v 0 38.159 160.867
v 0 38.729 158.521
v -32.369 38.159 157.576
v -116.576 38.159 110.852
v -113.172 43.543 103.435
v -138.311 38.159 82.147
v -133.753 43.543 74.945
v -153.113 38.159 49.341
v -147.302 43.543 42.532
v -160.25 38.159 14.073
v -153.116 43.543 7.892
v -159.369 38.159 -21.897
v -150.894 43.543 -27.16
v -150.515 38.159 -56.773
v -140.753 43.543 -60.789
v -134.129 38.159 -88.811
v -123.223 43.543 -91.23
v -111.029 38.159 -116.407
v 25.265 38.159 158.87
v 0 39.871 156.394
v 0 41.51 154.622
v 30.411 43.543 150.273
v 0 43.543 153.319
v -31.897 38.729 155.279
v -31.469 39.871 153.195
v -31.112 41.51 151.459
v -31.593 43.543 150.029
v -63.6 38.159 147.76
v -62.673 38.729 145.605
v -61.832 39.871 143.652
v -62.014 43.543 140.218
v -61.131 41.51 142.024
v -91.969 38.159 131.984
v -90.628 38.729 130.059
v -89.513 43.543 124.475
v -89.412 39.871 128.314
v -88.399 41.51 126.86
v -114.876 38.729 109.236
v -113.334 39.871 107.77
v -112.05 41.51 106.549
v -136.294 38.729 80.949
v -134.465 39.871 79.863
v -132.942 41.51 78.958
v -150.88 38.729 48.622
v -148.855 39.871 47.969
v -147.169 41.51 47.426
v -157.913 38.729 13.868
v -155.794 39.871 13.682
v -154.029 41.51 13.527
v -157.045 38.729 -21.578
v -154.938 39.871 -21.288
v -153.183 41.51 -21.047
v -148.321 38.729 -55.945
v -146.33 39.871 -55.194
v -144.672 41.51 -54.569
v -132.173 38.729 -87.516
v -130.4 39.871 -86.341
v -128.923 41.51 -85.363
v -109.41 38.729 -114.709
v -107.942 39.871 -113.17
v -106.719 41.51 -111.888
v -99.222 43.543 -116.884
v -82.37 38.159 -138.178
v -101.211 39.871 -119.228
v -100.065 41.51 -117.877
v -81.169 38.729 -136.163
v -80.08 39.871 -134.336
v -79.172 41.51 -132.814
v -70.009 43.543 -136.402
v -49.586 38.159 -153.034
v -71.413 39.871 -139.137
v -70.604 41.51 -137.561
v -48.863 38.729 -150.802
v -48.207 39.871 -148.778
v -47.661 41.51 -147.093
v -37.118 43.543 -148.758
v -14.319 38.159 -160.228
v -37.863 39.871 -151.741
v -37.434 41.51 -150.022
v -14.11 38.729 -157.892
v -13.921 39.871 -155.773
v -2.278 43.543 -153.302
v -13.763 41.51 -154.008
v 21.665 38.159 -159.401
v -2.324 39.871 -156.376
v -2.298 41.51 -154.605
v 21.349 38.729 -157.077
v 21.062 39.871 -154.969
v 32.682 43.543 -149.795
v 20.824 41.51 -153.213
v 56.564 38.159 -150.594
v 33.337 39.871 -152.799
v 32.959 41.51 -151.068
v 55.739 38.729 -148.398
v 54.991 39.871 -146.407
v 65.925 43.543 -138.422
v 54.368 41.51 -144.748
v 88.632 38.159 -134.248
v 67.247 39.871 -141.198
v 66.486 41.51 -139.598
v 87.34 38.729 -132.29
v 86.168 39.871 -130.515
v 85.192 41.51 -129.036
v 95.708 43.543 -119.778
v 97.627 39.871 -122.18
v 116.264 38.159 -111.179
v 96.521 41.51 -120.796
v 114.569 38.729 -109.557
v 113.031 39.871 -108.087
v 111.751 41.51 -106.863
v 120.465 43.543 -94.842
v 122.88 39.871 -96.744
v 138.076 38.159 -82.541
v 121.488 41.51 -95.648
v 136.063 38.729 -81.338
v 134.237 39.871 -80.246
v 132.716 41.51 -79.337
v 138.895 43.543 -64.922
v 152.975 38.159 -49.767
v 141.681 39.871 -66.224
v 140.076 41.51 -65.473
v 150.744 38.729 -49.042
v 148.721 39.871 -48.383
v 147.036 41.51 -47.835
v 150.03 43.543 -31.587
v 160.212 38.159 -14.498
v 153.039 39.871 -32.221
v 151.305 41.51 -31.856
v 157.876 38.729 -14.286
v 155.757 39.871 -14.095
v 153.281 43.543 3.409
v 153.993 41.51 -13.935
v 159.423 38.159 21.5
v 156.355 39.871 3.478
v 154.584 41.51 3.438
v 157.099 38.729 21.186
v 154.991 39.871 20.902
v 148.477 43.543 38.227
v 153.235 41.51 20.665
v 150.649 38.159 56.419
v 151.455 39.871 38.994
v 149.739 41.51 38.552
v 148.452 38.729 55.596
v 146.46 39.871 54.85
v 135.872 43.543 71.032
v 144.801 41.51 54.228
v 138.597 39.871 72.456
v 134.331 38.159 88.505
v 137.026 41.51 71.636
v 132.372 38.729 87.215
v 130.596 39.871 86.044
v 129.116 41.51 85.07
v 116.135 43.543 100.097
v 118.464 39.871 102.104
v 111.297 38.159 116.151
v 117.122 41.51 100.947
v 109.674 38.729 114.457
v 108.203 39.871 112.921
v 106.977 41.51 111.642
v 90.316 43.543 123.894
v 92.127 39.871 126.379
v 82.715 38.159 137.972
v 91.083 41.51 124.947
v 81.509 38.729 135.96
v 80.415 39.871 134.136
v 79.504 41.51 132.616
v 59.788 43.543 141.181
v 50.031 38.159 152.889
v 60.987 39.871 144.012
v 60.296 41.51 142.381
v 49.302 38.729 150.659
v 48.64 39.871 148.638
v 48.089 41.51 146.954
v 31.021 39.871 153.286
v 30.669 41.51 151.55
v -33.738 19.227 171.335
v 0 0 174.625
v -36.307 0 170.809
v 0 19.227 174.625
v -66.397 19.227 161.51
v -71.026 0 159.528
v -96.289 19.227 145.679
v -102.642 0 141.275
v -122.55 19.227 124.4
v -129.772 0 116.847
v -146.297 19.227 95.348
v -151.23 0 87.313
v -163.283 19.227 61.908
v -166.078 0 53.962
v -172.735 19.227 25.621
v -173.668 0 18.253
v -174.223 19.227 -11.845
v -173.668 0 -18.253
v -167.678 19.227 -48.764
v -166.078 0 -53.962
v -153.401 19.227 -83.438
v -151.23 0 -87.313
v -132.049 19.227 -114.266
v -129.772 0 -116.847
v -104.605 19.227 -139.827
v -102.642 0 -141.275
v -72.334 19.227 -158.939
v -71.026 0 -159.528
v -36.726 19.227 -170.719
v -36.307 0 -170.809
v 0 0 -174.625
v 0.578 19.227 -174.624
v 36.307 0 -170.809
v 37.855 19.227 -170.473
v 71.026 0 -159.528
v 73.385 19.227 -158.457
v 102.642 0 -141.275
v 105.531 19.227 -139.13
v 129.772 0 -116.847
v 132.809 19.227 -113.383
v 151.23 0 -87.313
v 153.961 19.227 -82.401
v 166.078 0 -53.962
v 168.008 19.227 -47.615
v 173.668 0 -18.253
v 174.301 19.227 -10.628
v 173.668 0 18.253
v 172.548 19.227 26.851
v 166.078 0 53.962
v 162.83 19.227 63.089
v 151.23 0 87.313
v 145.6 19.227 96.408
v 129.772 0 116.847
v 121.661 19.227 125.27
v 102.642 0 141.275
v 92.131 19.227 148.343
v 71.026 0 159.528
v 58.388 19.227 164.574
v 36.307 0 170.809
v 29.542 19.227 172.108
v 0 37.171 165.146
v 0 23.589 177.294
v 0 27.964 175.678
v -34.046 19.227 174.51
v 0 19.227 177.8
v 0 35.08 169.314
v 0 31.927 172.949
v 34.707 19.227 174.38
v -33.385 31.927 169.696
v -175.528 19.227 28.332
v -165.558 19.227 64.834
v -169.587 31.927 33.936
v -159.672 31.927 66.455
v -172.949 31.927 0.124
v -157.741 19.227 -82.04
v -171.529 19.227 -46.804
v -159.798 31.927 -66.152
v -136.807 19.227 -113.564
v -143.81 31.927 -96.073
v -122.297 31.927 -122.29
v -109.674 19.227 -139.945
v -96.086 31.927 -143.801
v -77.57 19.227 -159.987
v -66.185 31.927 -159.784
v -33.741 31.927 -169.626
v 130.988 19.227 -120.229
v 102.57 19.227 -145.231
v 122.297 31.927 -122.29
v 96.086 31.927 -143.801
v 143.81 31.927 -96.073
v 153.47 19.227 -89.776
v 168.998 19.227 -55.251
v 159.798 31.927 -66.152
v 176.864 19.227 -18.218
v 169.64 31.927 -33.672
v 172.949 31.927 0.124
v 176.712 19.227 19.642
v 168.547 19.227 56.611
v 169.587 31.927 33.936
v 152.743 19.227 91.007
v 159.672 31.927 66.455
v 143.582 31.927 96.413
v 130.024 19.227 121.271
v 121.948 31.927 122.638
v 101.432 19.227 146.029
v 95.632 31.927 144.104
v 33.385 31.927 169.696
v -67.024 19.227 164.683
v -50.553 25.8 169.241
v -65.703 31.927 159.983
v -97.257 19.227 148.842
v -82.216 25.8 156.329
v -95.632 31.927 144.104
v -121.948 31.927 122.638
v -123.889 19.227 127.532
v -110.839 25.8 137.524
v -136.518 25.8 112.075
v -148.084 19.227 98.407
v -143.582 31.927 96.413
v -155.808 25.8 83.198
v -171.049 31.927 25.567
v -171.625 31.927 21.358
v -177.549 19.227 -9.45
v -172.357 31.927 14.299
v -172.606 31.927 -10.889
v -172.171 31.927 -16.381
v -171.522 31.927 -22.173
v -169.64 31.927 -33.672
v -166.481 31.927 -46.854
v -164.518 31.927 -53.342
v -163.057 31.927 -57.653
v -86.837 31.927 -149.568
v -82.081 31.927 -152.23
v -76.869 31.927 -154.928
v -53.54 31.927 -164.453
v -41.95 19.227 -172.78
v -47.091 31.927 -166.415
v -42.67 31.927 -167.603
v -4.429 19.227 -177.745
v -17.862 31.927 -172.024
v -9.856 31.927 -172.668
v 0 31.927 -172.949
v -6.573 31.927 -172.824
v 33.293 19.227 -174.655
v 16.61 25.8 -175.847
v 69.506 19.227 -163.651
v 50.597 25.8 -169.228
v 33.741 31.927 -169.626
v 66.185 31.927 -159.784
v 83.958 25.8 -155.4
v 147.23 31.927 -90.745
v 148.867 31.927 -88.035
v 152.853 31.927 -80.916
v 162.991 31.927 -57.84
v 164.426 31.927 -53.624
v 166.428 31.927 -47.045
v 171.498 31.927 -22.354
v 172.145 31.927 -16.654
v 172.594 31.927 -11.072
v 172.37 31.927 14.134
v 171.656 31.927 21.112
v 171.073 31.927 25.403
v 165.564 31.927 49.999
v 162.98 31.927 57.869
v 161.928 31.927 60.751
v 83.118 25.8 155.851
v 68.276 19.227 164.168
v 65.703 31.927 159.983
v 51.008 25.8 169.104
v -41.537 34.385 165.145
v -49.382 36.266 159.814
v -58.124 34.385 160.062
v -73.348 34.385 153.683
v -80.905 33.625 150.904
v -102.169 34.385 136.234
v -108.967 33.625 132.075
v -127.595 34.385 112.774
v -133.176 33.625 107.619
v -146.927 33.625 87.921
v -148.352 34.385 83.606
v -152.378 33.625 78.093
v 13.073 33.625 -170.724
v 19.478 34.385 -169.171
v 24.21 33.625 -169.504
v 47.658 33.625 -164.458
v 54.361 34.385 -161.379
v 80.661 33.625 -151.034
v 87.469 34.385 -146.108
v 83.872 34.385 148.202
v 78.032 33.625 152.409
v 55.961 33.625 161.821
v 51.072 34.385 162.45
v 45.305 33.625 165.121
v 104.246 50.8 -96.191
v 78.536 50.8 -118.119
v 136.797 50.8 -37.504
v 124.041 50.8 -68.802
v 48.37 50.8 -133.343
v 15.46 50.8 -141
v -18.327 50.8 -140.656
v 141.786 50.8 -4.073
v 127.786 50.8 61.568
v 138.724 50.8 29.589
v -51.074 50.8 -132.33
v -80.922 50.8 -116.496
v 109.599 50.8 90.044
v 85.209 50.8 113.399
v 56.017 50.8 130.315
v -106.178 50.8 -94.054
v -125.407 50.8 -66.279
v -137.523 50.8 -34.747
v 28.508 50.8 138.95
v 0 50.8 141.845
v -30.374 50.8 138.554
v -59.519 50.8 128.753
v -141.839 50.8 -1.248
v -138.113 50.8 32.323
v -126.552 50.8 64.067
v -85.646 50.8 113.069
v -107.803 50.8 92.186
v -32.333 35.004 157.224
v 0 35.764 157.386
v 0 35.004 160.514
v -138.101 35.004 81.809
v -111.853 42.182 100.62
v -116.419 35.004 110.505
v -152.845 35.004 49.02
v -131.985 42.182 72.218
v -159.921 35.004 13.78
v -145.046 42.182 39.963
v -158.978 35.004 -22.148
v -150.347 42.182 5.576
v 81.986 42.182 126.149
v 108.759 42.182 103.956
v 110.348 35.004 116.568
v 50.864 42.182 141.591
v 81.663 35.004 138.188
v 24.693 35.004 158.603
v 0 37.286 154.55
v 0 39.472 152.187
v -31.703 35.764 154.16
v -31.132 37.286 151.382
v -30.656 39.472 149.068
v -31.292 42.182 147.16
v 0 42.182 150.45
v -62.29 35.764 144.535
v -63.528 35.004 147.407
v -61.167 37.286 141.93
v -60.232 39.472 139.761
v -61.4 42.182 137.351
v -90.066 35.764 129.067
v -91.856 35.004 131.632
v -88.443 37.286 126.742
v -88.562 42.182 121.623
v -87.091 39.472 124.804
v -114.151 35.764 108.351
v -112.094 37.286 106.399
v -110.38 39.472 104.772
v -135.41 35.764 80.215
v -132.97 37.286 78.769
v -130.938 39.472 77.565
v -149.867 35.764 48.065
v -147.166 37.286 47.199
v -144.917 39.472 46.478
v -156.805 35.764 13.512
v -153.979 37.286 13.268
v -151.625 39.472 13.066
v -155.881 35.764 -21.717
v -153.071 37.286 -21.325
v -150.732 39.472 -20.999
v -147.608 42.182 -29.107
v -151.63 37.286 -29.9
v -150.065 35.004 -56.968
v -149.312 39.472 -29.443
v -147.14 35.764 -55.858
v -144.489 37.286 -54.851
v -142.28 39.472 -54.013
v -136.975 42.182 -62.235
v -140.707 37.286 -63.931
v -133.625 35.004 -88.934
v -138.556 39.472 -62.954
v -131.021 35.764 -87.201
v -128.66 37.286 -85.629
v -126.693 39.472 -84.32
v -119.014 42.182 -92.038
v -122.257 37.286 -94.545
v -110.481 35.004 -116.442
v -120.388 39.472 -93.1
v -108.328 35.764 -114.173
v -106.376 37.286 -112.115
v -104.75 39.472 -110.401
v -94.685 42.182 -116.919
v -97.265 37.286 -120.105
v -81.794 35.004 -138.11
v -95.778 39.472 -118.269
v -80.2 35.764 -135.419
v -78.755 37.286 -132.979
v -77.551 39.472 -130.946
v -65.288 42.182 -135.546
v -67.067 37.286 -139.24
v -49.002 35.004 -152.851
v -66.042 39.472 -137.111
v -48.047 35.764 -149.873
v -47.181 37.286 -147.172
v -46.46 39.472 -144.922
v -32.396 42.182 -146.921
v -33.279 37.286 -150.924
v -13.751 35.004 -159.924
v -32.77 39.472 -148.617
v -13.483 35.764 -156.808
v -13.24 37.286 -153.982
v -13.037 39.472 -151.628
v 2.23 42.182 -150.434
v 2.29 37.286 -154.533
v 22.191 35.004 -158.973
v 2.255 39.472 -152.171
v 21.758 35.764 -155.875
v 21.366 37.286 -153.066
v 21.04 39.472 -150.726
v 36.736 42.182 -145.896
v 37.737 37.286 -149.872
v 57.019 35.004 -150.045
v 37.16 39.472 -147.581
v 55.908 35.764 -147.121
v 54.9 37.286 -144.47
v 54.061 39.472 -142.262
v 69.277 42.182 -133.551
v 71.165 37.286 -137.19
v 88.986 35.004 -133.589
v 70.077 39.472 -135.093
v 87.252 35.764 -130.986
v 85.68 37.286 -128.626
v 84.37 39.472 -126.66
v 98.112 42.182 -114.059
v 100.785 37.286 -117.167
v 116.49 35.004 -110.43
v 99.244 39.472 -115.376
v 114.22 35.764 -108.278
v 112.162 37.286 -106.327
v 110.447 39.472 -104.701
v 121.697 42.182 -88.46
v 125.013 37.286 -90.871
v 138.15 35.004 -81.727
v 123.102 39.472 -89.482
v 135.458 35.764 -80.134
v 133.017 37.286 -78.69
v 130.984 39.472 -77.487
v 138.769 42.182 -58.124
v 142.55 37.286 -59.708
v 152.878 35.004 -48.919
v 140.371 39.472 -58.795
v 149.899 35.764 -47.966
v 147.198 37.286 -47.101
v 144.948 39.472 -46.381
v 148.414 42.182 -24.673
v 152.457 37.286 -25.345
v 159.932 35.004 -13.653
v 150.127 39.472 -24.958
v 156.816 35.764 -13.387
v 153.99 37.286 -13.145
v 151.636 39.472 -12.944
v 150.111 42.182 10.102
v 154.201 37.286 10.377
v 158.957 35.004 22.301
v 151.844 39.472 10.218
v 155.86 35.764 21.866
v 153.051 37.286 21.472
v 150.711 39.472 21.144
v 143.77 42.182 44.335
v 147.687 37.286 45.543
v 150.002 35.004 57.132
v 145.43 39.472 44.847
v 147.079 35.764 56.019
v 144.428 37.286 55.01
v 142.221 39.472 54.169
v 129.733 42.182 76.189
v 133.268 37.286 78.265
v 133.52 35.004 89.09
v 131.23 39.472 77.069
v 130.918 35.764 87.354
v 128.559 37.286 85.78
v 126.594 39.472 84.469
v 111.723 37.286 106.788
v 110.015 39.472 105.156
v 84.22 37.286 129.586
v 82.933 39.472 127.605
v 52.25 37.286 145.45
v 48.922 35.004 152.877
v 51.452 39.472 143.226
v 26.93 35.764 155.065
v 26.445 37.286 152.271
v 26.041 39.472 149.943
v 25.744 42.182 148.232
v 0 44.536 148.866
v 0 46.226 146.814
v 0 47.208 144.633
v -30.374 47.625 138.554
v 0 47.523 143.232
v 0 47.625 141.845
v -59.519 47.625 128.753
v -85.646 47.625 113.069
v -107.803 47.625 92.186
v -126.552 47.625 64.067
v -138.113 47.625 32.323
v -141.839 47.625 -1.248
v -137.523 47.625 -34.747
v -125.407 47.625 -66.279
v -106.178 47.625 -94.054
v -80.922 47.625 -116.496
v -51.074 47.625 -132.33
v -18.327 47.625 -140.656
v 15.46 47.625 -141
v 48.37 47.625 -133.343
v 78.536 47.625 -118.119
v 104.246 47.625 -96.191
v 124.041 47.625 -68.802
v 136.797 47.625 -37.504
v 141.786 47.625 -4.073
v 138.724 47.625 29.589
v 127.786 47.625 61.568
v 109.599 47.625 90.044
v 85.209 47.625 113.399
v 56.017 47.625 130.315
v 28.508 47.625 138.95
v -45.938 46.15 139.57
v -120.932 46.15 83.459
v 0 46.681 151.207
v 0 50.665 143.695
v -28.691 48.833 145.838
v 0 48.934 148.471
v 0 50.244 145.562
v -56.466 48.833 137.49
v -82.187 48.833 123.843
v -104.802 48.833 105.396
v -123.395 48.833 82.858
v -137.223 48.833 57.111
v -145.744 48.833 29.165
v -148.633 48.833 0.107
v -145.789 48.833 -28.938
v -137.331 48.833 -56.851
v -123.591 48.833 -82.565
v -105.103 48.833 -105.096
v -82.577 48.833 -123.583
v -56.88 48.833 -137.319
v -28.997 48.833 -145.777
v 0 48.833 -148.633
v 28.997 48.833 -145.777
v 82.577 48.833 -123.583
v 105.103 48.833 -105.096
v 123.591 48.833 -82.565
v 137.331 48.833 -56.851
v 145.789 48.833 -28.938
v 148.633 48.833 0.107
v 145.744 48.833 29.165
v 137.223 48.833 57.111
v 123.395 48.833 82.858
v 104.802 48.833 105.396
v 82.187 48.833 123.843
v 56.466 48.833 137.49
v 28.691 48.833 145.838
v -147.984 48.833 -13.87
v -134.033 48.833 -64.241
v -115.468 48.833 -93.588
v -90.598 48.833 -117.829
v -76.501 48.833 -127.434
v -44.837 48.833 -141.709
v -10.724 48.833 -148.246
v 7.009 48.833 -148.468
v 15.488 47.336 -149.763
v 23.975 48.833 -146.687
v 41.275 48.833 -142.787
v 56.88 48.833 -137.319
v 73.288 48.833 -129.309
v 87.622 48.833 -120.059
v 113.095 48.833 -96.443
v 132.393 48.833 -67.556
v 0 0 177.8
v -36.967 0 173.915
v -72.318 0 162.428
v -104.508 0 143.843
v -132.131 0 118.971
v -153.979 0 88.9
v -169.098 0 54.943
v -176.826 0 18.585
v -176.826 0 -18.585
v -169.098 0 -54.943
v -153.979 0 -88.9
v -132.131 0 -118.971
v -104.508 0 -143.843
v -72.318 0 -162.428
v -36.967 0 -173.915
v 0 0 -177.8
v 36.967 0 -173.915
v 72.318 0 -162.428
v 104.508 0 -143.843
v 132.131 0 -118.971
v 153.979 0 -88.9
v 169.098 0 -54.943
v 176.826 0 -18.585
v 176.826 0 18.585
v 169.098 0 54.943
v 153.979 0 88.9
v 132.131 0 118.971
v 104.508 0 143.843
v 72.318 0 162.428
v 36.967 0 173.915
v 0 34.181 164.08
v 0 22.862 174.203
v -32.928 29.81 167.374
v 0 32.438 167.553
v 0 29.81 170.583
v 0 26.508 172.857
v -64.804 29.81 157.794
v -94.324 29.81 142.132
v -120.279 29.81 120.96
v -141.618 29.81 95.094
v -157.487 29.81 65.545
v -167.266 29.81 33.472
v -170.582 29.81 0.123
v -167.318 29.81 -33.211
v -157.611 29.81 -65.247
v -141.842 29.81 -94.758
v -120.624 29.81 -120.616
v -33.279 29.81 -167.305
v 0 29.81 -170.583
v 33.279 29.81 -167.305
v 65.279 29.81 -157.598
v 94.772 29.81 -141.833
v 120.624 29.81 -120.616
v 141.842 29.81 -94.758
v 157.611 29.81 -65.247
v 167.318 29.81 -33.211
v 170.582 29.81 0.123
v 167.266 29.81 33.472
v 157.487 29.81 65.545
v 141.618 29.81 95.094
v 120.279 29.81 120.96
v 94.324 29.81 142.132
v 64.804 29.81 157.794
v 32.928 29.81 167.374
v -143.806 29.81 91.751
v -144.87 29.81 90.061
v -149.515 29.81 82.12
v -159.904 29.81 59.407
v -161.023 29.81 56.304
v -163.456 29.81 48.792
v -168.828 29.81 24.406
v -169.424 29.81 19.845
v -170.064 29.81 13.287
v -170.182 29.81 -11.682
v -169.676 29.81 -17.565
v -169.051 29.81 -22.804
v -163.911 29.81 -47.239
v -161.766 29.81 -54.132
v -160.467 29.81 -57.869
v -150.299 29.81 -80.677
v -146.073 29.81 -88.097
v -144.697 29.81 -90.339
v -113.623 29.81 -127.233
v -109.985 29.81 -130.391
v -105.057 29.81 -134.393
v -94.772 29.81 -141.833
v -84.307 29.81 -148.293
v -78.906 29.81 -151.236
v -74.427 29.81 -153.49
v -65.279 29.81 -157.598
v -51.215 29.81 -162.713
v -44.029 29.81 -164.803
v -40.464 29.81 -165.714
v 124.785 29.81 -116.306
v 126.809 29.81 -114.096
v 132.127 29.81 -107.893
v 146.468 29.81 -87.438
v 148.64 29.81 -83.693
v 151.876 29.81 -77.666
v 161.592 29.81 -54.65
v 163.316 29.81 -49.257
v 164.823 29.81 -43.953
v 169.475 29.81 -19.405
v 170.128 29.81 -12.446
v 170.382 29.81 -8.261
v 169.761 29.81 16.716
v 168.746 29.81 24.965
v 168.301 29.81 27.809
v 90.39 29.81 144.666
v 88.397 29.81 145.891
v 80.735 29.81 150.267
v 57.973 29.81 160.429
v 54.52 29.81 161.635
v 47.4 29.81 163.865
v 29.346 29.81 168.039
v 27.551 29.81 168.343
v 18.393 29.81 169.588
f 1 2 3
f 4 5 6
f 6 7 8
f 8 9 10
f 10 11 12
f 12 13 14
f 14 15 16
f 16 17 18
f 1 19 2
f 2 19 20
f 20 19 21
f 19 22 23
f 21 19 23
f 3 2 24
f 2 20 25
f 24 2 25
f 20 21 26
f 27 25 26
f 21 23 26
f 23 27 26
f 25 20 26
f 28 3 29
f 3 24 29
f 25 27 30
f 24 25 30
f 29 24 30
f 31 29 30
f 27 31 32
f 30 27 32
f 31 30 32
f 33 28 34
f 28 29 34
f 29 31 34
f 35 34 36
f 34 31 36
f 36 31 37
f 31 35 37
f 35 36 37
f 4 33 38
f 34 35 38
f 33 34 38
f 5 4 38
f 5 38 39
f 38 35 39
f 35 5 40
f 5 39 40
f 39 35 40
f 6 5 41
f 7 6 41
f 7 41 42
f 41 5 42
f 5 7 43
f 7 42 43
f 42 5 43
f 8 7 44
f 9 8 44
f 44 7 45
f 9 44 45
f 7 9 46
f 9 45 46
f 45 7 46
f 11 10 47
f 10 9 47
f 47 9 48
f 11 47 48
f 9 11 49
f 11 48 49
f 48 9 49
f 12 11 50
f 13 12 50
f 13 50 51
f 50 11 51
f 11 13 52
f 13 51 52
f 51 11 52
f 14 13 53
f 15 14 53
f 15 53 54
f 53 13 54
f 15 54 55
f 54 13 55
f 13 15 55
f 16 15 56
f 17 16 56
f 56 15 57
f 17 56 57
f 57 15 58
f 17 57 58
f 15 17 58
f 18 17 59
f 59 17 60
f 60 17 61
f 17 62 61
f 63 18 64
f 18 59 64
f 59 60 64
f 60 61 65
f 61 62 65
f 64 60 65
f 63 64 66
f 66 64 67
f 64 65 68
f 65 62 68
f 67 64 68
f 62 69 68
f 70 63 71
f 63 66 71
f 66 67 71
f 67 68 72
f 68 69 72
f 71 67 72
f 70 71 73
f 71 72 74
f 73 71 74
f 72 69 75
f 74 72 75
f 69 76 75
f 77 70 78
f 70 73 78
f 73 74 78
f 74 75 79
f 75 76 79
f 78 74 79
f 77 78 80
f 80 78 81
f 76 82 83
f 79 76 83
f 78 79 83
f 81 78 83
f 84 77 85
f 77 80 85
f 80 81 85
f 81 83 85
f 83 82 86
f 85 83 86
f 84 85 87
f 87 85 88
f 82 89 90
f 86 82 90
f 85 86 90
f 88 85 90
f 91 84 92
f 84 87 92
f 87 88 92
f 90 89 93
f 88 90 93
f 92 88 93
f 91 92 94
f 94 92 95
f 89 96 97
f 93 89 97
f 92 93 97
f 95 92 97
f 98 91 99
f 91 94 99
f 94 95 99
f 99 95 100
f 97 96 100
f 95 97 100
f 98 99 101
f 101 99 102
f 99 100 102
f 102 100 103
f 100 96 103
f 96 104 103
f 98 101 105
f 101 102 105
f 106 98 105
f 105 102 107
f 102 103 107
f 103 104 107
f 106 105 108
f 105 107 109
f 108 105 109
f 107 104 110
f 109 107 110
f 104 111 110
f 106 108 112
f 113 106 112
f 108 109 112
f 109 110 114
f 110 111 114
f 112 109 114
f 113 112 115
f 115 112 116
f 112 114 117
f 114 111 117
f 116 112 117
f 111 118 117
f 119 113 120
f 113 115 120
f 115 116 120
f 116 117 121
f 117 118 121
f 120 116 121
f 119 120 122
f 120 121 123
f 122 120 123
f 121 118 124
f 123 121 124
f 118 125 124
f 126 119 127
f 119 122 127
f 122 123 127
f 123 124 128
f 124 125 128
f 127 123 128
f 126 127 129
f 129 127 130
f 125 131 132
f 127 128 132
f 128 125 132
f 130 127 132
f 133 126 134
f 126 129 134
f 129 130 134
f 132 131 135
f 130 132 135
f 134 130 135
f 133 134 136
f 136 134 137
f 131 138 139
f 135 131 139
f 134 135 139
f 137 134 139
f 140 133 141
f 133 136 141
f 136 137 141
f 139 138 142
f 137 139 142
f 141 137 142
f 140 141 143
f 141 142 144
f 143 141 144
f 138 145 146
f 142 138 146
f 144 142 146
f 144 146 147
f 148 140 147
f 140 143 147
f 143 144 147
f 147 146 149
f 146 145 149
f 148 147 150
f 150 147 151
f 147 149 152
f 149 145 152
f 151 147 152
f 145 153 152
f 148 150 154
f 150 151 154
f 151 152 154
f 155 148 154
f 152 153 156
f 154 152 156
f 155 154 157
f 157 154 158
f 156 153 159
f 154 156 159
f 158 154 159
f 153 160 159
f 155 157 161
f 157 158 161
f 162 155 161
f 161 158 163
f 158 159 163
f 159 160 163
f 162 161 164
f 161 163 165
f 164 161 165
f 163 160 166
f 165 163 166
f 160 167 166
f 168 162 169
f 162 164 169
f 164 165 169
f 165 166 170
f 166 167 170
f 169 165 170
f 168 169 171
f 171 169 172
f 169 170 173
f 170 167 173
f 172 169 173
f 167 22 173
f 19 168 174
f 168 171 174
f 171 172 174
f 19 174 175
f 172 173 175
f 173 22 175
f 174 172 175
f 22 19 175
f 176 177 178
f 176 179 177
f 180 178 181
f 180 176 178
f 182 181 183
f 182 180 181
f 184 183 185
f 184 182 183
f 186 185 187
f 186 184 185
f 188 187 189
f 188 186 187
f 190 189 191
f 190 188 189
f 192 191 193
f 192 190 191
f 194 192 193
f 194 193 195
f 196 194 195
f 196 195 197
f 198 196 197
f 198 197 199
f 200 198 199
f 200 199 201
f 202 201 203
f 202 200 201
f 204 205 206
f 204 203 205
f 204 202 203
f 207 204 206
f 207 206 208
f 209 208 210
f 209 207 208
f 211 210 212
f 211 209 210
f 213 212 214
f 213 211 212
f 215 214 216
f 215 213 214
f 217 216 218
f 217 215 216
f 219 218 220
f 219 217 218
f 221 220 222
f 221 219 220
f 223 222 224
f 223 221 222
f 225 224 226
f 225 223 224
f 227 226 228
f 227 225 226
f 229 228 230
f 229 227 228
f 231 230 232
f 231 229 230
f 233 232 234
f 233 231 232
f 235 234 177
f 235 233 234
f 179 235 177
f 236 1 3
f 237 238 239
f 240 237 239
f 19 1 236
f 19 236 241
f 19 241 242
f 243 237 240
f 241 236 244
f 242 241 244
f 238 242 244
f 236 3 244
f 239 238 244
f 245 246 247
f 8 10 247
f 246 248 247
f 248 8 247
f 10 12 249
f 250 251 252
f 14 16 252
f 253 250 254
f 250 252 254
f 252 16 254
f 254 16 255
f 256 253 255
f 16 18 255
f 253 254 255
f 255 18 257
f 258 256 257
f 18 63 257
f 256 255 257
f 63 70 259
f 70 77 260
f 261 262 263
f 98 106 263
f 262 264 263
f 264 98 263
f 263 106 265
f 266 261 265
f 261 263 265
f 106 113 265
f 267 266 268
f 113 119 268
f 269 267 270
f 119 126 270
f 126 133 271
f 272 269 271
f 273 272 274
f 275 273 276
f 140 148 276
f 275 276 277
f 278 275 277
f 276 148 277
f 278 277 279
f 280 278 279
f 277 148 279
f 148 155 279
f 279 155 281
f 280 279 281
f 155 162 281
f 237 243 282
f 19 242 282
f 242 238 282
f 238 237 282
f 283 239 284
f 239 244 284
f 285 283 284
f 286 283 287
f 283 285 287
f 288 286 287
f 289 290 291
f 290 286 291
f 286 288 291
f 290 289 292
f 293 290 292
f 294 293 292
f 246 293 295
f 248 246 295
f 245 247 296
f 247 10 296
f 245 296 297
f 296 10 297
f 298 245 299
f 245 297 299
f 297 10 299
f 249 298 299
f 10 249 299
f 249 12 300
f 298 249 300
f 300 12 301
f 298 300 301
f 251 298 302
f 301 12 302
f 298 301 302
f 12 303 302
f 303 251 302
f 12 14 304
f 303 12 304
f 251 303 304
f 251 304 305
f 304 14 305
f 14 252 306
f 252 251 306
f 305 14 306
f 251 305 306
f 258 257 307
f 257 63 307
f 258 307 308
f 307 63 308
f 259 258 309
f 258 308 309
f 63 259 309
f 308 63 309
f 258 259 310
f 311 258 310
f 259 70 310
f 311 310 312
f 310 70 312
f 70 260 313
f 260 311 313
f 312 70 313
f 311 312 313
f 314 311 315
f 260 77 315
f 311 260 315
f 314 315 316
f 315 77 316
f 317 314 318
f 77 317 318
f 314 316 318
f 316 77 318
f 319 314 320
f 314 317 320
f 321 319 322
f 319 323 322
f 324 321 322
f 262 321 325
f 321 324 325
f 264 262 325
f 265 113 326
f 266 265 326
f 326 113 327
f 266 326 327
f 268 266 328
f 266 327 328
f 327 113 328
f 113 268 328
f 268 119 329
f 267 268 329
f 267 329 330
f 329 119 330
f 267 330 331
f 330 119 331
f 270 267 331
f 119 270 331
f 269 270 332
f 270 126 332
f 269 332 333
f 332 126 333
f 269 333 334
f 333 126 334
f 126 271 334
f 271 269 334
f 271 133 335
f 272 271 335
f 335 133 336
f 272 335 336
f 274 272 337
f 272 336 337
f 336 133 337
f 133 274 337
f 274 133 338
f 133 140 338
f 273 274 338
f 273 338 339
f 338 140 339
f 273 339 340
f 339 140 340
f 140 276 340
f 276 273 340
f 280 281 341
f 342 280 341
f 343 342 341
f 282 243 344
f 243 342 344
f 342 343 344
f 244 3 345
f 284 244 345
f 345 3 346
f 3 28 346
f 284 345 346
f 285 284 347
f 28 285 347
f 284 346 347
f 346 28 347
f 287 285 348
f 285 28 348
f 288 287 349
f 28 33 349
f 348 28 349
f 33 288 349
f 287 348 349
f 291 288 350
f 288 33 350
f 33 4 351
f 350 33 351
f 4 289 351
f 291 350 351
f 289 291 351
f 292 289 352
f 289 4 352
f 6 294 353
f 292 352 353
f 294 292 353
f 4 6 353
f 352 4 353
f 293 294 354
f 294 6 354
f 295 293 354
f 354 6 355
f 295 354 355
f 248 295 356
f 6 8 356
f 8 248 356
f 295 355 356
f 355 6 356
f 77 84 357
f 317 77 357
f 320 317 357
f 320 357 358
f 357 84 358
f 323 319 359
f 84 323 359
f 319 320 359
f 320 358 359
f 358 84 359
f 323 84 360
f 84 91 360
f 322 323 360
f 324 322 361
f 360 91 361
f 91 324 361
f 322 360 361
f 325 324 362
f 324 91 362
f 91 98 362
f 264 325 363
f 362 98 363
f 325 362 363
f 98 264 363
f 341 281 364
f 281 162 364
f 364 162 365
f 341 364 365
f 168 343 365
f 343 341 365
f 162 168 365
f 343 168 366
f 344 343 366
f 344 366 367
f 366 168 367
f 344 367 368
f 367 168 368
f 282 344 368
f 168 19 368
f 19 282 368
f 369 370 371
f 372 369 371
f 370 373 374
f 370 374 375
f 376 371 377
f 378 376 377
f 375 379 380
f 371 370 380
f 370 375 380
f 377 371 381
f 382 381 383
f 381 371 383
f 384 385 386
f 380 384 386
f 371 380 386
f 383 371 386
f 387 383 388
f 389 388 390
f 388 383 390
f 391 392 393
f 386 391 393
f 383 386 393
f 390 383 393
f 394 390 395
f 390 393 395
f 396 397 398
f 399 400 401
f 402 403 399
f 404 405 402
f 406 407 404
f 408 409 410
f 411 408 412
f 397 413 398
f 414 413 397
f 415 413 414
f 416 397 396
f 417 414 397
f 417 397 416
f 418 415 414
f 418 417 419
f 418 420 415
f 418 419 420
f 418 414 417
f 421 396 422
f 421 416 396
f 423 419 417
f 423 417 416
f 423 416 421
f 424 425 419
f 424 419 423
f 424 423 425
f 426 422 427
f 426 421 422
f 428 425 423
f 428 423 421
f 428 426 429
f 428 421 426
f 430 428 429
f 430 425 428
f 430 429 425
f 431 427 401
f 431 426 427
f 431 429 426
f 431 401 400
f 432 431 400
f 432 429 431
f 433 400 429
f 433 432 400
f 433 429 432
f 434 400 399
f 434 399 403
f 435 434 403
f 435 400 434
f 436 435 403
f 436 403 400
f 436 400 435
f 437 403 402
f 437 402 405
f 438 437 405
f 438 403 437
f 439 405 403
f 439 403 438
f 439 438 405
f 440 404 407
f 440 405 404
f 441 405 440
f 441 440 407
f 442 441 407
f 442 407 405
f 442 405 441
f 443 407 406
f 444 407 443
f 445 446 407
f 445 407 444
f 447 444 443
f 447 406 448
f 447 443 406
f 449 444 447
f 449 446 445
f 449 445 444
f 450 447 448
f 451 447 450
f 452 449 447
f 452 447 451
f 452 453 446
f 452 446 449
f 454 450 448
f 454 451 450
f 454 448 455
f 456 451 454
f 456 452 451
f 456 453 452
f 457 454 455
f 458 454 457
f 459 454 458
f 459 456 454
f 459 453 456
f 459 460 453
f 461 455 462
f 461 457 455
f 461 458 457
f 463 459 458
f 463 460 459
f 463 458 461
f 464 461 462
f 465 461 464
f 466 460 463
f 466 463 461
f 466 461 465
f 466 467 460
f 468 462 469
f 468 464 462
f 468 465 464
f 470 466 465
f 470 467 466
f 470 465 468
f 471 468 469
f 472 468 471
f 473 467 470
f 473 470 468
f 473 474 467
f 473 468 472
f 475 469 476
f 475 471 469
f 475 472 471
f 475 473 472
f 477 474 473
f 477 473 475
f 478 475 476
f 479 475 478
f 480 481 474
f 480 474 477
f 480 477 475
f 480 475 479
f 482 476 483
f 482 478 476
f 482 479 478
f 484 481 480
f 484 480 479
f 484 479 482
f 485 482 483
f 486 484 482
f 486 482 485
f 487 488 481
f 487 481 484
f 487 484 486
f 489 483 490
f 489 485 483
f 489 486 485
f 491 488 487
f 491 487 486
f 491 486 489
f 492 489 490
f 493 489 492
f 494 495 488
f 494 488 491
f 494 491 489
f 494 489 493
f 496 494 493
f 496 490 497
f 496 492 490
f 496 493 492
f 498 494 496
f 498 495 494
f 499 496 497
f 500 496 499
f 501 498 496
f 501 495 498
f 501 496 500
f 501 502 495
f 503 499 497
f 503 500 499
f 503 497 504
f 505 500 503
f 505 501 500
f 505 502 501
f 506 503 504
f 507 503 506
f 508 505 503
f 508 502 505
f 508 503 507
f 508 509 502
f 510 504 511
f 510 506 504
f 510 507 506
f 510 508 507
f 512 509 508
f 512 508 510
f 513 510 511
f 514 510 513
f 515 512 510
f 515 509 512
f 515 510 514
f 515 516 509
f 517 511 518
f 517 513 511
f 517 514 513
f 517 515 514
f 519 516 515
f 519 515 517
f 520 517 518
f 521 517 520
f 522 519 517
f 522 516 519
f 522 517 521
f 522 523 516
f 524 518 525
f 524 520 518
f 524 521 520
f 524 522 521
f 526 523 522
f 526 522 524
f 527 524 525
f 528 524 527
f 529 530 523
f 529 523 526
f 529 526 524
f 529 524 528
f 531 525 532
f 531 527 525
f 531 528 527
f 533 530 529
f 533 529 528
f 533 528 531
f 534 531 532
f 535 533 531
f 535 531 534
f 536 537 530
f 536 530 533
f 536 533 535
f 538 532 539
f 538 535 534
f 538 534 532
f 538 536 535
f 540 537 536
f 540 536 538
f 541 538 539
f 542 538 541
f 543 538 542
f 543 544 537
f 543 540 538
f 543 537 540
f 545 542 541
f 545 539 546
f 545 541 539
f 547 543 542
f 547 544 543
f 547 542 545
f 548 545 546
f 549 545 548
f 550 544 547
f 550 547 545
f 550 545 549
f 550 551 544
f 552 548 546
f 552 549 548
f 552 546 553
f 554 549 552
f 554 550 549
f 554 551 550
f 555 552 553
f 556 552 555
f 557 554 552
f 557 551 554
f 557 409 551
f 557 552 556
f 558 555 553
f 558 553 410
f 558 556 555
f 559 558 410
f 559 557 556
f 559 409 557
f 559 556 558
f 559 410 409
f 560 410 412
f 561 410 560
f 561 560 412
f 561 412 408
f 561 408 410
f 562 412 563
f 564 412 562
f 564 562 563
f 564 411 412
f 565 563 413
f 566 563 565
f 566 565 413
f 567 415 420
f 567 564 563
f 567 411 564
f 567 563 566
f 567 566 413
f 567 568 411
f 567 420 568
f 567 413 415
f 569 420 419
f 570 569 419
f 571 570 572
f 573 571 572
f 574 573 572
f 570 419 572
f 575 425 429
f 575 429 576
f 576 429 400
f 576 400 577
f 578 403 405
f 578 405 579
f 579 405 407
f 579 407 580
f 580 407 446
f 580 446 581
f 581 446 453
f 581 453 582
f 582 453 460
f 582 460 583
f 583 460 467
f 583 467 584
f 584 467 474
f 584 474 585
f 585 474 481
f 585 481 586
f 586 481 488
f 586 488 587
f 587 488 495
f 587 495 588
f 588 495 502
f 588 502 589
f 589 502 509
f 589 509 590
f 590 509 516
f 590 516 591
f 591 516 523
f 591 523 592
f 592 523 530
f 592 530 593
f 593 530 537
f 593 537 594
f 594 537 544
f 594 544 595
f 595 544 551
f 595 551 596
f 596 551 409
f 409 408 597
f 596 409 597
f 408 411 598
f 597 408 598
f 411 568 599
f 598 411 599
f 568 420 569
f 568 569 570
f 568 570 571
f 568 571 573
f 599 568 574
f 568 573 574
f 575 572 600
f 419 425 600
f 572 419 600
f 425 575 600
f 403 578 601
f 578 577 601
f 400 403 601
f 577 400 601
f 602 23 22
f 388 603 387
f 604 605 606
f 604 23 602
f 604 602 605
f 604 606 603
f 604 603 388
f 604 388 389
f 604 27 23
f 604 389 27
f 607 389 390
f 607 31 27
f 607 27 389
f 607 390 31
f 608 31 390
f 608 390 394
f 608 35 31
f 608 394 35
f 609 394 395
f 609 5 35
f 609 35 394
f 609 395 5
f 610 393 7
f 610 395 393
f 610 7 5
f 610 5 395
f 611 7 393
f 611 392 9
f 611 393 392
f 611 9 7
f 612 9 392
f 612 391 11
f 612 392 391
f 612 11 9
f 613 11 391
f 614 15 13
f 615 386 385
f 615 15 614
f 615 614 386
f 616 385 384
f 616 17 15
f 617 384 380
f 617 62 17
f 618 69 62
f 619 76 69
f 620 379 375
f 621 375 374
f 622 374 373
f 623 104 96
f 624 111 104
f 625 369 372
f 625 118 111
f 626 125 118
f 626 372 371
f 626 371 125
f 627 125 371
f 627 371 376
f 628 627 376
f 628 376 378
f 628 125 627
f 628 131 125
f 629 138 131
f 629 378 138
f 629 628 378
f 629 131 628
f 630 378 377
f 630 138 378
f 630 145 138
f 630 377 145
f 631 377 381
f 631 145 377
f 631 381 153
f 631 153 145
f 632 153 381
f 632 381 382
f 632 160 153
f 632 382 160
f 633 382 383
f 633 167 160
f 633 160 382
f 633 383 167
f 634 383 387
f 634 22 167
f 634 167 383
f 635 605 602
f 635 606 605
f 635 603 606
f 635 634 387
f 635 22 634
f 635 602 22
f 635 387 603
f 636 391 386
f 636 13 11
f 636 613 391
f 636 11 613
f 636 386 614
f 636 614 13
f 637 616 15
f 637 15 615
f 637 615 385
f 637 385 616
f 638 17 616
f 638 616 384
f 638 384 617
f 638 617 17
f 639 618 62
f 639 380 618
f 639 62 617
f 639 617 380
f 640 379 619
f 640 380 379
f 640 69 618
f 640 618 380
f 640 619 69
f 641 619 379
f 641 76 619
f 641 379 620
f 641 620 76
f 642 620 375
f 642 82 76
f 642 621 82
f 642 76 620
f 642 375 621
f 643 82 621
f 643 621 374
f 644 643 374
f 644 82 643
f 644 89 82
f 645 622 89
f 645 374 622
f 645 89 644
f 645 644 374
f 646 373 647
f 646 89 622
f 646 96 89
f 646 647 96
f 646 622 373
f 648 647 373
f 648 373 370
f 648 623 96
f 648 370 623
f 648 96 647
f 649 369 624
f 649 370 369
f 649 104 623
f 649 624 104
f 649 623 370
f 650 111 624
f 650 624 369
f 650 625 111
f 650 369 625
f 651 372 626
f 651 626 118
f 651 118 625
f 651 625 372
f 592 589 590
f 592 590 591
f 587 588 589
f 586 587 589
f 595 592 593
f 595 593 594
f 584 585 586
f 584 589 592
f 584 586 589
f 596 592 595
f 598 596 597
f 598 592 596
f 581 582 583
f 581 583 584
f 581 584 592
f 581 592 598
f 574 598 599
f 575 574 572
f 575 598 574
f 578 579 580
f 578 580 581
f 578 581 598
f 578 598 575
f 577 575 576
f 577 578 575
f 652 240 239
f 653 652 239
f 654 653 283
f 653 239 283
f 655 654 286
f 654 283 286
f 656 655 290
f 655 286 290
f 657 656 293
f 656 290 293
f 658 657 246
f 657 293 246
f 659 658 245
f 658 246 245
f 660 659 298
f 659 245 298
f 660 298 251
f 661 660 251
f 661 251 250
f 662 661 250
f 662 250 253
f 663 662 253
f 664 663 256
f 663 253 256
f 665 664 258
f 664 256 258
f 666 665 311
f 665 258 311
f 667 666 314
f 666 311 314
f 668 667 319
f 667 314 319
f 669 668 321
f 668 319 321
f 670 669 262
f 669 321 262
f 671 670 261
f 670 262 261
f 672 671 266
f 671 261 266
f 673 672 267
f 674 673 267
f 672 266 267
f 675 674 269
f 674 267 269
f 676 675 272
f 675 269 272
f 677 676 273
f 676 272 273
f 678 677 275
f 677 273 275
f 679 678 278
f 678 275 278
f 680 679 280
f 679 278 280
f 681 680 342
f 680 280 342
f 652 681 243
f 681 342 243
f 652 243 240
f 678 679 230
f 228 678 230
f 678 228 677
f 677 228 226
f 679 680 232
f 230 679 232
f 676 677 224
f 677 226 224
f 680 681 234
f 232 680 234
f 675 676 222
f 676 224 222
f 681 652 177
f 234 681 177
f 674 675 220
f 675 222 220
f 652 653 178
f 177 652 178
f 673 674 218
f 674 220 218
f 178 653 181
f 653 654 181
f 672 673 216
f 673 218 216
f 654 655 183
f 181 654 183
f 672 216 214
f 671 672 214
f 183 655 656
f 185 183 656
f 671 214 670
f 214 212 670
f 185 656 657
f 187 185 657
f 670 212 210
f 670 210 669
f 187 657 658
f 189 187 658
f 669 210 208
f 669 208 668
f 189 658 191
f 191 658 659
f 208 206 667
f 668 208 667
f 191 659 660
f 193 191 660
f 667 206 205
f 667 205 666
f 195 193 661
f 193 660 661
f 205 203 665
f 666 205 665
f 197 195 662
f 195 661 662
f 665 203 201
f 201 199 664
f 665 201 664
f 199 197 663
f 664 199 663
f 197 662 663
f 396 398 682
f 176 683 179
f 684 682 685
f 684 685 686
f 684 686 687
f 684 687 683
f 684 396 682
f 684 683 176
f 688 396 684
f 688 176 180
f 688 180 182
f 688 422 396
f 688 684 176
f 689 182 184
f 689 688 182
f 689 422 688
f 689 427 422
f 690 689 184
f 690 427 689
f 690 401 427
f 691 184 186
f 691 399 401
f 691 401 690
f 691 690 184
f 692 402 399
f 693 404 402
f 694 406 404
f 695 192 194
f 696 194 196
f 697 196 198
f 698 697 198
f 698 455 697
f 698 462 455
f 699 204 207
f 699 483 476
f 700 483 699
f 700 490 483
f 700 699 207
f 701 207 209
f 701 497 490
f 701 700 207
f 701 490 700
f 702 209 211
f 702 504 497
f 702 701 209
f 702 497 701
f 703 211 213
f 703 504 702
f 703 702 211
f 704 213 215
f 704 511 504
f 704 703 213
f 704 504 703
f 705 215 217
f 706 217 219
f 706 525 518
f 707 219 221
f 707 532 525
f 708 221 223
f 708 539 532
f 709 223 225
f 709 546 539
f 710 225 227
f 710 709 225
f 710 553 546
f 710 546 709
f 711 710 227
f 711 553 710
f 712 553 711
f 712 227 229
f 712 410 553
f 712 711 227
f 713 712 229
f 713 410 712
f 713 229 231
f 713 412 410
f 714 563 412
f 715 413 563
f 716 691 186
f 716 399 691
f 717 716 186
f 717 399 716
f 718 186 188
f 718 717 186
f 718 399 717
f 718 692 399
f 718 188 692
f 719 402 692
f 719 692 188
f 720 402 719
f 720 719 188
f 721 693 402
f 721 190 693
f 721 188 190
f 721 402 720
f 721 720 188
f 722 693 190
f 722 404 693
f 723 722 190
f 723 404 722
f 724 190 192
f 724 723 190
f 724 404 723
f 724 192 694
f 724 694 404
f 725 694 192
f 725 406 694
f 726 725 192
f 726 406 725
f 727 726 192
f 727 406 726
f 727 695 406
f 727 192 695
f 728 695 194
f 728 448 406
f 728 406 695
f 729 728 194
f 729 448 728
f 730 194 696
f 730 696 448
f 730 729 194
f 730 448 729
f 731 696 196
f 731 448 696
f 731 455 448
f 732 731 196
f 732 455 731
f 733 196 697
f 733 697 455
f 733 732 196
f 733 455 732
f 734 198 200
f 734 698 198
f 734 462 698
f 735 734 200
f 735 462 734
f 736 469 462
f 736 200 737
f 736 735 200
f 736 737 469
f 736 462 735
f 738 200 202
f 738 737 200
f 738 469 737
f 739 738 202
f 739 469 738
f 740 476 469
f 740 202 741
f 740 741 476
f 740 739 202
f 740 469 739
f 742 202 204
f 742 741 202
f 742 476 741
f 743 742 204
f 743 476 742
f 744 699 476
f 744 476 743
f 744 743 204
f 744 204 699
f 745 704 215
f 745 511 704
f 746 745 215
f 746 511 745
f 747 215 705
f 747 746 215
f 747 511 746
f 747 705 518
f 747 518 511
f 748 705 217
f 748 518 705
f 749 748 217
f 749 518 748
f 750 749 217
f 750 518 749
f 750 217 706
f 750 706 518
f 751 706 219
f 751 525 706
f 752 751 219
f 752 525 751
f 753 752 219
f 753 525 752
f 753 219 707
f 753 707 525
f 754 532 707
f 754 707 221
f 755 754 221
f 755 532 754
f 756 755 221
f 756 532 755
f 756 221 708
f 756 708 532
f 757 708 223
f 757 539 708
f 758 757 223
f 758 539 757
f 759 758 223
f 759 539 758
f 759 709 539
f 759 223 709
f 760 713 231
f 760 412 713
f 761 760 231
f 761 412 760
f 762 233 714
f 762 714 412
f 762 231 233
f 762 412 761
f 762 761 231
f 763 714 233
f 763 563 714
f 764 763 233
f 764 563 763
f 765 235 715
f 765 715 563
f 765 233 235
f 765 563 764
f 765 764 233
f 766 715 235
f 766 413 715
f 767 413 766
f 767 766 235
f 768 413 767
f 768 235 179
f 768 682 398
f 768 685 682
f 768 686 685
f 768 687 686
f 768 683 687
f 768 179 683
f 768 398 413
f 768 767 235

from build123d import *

# Parameters (mm, degrees)
FILLET1_R = 9.525
FILLET2_R = 19.05
FILLET3_R = 12.7
SHELL1_T  = -3.175


with BuildPart() as part:
    # Sketch1 → Revolve1 (revolve)
    with BuildSketch(Plane(origin=(0, 0, 0), x_dir=(0, 0, -1), z_dir=(1, 0, 0))):
        Polygon((0, 0), (-177.8, 0), (-177.8, 38.1), (-152.4, 38.1), (-152.4, 50.8), (0, 50.8), align=None)
    revolve(axis=Axis((0, 50.8, 0), (0, -1, 0)))

    # Fillet1
    fillet1_edges = [part.edges().sort_by_distance(p)[0] for p in [
        (0, 38.1, -152.4),
    ]]
    fillet(fillet1_edges, radius=FILLET1_R)

    # Fillet2
    fillet2_edges = [part.edges().sort_by_distance(p)[0] for p in [
        (0, 38.1, -177.8),
    ]]
    fillet(fillet2_edges, radius=FILLET2_R)

    # Fillet3
    fillet3_edges = [part.edges().sort_by_distance(p)[0] for p in [
        (0, 50.8, -152.4),
    ]]
    fillet(fillet3_edges, radius=FILLET3_R)

    # Shell1
    shell1_openings = [part.faces().sort_by_distance(p)[0] for p in [
        (0, 0, 0),
    ]]
    offset(amount=SHELL1_T, openings=shell1_openings, kind=Kind.INTERSECTION)


solid = part.part
